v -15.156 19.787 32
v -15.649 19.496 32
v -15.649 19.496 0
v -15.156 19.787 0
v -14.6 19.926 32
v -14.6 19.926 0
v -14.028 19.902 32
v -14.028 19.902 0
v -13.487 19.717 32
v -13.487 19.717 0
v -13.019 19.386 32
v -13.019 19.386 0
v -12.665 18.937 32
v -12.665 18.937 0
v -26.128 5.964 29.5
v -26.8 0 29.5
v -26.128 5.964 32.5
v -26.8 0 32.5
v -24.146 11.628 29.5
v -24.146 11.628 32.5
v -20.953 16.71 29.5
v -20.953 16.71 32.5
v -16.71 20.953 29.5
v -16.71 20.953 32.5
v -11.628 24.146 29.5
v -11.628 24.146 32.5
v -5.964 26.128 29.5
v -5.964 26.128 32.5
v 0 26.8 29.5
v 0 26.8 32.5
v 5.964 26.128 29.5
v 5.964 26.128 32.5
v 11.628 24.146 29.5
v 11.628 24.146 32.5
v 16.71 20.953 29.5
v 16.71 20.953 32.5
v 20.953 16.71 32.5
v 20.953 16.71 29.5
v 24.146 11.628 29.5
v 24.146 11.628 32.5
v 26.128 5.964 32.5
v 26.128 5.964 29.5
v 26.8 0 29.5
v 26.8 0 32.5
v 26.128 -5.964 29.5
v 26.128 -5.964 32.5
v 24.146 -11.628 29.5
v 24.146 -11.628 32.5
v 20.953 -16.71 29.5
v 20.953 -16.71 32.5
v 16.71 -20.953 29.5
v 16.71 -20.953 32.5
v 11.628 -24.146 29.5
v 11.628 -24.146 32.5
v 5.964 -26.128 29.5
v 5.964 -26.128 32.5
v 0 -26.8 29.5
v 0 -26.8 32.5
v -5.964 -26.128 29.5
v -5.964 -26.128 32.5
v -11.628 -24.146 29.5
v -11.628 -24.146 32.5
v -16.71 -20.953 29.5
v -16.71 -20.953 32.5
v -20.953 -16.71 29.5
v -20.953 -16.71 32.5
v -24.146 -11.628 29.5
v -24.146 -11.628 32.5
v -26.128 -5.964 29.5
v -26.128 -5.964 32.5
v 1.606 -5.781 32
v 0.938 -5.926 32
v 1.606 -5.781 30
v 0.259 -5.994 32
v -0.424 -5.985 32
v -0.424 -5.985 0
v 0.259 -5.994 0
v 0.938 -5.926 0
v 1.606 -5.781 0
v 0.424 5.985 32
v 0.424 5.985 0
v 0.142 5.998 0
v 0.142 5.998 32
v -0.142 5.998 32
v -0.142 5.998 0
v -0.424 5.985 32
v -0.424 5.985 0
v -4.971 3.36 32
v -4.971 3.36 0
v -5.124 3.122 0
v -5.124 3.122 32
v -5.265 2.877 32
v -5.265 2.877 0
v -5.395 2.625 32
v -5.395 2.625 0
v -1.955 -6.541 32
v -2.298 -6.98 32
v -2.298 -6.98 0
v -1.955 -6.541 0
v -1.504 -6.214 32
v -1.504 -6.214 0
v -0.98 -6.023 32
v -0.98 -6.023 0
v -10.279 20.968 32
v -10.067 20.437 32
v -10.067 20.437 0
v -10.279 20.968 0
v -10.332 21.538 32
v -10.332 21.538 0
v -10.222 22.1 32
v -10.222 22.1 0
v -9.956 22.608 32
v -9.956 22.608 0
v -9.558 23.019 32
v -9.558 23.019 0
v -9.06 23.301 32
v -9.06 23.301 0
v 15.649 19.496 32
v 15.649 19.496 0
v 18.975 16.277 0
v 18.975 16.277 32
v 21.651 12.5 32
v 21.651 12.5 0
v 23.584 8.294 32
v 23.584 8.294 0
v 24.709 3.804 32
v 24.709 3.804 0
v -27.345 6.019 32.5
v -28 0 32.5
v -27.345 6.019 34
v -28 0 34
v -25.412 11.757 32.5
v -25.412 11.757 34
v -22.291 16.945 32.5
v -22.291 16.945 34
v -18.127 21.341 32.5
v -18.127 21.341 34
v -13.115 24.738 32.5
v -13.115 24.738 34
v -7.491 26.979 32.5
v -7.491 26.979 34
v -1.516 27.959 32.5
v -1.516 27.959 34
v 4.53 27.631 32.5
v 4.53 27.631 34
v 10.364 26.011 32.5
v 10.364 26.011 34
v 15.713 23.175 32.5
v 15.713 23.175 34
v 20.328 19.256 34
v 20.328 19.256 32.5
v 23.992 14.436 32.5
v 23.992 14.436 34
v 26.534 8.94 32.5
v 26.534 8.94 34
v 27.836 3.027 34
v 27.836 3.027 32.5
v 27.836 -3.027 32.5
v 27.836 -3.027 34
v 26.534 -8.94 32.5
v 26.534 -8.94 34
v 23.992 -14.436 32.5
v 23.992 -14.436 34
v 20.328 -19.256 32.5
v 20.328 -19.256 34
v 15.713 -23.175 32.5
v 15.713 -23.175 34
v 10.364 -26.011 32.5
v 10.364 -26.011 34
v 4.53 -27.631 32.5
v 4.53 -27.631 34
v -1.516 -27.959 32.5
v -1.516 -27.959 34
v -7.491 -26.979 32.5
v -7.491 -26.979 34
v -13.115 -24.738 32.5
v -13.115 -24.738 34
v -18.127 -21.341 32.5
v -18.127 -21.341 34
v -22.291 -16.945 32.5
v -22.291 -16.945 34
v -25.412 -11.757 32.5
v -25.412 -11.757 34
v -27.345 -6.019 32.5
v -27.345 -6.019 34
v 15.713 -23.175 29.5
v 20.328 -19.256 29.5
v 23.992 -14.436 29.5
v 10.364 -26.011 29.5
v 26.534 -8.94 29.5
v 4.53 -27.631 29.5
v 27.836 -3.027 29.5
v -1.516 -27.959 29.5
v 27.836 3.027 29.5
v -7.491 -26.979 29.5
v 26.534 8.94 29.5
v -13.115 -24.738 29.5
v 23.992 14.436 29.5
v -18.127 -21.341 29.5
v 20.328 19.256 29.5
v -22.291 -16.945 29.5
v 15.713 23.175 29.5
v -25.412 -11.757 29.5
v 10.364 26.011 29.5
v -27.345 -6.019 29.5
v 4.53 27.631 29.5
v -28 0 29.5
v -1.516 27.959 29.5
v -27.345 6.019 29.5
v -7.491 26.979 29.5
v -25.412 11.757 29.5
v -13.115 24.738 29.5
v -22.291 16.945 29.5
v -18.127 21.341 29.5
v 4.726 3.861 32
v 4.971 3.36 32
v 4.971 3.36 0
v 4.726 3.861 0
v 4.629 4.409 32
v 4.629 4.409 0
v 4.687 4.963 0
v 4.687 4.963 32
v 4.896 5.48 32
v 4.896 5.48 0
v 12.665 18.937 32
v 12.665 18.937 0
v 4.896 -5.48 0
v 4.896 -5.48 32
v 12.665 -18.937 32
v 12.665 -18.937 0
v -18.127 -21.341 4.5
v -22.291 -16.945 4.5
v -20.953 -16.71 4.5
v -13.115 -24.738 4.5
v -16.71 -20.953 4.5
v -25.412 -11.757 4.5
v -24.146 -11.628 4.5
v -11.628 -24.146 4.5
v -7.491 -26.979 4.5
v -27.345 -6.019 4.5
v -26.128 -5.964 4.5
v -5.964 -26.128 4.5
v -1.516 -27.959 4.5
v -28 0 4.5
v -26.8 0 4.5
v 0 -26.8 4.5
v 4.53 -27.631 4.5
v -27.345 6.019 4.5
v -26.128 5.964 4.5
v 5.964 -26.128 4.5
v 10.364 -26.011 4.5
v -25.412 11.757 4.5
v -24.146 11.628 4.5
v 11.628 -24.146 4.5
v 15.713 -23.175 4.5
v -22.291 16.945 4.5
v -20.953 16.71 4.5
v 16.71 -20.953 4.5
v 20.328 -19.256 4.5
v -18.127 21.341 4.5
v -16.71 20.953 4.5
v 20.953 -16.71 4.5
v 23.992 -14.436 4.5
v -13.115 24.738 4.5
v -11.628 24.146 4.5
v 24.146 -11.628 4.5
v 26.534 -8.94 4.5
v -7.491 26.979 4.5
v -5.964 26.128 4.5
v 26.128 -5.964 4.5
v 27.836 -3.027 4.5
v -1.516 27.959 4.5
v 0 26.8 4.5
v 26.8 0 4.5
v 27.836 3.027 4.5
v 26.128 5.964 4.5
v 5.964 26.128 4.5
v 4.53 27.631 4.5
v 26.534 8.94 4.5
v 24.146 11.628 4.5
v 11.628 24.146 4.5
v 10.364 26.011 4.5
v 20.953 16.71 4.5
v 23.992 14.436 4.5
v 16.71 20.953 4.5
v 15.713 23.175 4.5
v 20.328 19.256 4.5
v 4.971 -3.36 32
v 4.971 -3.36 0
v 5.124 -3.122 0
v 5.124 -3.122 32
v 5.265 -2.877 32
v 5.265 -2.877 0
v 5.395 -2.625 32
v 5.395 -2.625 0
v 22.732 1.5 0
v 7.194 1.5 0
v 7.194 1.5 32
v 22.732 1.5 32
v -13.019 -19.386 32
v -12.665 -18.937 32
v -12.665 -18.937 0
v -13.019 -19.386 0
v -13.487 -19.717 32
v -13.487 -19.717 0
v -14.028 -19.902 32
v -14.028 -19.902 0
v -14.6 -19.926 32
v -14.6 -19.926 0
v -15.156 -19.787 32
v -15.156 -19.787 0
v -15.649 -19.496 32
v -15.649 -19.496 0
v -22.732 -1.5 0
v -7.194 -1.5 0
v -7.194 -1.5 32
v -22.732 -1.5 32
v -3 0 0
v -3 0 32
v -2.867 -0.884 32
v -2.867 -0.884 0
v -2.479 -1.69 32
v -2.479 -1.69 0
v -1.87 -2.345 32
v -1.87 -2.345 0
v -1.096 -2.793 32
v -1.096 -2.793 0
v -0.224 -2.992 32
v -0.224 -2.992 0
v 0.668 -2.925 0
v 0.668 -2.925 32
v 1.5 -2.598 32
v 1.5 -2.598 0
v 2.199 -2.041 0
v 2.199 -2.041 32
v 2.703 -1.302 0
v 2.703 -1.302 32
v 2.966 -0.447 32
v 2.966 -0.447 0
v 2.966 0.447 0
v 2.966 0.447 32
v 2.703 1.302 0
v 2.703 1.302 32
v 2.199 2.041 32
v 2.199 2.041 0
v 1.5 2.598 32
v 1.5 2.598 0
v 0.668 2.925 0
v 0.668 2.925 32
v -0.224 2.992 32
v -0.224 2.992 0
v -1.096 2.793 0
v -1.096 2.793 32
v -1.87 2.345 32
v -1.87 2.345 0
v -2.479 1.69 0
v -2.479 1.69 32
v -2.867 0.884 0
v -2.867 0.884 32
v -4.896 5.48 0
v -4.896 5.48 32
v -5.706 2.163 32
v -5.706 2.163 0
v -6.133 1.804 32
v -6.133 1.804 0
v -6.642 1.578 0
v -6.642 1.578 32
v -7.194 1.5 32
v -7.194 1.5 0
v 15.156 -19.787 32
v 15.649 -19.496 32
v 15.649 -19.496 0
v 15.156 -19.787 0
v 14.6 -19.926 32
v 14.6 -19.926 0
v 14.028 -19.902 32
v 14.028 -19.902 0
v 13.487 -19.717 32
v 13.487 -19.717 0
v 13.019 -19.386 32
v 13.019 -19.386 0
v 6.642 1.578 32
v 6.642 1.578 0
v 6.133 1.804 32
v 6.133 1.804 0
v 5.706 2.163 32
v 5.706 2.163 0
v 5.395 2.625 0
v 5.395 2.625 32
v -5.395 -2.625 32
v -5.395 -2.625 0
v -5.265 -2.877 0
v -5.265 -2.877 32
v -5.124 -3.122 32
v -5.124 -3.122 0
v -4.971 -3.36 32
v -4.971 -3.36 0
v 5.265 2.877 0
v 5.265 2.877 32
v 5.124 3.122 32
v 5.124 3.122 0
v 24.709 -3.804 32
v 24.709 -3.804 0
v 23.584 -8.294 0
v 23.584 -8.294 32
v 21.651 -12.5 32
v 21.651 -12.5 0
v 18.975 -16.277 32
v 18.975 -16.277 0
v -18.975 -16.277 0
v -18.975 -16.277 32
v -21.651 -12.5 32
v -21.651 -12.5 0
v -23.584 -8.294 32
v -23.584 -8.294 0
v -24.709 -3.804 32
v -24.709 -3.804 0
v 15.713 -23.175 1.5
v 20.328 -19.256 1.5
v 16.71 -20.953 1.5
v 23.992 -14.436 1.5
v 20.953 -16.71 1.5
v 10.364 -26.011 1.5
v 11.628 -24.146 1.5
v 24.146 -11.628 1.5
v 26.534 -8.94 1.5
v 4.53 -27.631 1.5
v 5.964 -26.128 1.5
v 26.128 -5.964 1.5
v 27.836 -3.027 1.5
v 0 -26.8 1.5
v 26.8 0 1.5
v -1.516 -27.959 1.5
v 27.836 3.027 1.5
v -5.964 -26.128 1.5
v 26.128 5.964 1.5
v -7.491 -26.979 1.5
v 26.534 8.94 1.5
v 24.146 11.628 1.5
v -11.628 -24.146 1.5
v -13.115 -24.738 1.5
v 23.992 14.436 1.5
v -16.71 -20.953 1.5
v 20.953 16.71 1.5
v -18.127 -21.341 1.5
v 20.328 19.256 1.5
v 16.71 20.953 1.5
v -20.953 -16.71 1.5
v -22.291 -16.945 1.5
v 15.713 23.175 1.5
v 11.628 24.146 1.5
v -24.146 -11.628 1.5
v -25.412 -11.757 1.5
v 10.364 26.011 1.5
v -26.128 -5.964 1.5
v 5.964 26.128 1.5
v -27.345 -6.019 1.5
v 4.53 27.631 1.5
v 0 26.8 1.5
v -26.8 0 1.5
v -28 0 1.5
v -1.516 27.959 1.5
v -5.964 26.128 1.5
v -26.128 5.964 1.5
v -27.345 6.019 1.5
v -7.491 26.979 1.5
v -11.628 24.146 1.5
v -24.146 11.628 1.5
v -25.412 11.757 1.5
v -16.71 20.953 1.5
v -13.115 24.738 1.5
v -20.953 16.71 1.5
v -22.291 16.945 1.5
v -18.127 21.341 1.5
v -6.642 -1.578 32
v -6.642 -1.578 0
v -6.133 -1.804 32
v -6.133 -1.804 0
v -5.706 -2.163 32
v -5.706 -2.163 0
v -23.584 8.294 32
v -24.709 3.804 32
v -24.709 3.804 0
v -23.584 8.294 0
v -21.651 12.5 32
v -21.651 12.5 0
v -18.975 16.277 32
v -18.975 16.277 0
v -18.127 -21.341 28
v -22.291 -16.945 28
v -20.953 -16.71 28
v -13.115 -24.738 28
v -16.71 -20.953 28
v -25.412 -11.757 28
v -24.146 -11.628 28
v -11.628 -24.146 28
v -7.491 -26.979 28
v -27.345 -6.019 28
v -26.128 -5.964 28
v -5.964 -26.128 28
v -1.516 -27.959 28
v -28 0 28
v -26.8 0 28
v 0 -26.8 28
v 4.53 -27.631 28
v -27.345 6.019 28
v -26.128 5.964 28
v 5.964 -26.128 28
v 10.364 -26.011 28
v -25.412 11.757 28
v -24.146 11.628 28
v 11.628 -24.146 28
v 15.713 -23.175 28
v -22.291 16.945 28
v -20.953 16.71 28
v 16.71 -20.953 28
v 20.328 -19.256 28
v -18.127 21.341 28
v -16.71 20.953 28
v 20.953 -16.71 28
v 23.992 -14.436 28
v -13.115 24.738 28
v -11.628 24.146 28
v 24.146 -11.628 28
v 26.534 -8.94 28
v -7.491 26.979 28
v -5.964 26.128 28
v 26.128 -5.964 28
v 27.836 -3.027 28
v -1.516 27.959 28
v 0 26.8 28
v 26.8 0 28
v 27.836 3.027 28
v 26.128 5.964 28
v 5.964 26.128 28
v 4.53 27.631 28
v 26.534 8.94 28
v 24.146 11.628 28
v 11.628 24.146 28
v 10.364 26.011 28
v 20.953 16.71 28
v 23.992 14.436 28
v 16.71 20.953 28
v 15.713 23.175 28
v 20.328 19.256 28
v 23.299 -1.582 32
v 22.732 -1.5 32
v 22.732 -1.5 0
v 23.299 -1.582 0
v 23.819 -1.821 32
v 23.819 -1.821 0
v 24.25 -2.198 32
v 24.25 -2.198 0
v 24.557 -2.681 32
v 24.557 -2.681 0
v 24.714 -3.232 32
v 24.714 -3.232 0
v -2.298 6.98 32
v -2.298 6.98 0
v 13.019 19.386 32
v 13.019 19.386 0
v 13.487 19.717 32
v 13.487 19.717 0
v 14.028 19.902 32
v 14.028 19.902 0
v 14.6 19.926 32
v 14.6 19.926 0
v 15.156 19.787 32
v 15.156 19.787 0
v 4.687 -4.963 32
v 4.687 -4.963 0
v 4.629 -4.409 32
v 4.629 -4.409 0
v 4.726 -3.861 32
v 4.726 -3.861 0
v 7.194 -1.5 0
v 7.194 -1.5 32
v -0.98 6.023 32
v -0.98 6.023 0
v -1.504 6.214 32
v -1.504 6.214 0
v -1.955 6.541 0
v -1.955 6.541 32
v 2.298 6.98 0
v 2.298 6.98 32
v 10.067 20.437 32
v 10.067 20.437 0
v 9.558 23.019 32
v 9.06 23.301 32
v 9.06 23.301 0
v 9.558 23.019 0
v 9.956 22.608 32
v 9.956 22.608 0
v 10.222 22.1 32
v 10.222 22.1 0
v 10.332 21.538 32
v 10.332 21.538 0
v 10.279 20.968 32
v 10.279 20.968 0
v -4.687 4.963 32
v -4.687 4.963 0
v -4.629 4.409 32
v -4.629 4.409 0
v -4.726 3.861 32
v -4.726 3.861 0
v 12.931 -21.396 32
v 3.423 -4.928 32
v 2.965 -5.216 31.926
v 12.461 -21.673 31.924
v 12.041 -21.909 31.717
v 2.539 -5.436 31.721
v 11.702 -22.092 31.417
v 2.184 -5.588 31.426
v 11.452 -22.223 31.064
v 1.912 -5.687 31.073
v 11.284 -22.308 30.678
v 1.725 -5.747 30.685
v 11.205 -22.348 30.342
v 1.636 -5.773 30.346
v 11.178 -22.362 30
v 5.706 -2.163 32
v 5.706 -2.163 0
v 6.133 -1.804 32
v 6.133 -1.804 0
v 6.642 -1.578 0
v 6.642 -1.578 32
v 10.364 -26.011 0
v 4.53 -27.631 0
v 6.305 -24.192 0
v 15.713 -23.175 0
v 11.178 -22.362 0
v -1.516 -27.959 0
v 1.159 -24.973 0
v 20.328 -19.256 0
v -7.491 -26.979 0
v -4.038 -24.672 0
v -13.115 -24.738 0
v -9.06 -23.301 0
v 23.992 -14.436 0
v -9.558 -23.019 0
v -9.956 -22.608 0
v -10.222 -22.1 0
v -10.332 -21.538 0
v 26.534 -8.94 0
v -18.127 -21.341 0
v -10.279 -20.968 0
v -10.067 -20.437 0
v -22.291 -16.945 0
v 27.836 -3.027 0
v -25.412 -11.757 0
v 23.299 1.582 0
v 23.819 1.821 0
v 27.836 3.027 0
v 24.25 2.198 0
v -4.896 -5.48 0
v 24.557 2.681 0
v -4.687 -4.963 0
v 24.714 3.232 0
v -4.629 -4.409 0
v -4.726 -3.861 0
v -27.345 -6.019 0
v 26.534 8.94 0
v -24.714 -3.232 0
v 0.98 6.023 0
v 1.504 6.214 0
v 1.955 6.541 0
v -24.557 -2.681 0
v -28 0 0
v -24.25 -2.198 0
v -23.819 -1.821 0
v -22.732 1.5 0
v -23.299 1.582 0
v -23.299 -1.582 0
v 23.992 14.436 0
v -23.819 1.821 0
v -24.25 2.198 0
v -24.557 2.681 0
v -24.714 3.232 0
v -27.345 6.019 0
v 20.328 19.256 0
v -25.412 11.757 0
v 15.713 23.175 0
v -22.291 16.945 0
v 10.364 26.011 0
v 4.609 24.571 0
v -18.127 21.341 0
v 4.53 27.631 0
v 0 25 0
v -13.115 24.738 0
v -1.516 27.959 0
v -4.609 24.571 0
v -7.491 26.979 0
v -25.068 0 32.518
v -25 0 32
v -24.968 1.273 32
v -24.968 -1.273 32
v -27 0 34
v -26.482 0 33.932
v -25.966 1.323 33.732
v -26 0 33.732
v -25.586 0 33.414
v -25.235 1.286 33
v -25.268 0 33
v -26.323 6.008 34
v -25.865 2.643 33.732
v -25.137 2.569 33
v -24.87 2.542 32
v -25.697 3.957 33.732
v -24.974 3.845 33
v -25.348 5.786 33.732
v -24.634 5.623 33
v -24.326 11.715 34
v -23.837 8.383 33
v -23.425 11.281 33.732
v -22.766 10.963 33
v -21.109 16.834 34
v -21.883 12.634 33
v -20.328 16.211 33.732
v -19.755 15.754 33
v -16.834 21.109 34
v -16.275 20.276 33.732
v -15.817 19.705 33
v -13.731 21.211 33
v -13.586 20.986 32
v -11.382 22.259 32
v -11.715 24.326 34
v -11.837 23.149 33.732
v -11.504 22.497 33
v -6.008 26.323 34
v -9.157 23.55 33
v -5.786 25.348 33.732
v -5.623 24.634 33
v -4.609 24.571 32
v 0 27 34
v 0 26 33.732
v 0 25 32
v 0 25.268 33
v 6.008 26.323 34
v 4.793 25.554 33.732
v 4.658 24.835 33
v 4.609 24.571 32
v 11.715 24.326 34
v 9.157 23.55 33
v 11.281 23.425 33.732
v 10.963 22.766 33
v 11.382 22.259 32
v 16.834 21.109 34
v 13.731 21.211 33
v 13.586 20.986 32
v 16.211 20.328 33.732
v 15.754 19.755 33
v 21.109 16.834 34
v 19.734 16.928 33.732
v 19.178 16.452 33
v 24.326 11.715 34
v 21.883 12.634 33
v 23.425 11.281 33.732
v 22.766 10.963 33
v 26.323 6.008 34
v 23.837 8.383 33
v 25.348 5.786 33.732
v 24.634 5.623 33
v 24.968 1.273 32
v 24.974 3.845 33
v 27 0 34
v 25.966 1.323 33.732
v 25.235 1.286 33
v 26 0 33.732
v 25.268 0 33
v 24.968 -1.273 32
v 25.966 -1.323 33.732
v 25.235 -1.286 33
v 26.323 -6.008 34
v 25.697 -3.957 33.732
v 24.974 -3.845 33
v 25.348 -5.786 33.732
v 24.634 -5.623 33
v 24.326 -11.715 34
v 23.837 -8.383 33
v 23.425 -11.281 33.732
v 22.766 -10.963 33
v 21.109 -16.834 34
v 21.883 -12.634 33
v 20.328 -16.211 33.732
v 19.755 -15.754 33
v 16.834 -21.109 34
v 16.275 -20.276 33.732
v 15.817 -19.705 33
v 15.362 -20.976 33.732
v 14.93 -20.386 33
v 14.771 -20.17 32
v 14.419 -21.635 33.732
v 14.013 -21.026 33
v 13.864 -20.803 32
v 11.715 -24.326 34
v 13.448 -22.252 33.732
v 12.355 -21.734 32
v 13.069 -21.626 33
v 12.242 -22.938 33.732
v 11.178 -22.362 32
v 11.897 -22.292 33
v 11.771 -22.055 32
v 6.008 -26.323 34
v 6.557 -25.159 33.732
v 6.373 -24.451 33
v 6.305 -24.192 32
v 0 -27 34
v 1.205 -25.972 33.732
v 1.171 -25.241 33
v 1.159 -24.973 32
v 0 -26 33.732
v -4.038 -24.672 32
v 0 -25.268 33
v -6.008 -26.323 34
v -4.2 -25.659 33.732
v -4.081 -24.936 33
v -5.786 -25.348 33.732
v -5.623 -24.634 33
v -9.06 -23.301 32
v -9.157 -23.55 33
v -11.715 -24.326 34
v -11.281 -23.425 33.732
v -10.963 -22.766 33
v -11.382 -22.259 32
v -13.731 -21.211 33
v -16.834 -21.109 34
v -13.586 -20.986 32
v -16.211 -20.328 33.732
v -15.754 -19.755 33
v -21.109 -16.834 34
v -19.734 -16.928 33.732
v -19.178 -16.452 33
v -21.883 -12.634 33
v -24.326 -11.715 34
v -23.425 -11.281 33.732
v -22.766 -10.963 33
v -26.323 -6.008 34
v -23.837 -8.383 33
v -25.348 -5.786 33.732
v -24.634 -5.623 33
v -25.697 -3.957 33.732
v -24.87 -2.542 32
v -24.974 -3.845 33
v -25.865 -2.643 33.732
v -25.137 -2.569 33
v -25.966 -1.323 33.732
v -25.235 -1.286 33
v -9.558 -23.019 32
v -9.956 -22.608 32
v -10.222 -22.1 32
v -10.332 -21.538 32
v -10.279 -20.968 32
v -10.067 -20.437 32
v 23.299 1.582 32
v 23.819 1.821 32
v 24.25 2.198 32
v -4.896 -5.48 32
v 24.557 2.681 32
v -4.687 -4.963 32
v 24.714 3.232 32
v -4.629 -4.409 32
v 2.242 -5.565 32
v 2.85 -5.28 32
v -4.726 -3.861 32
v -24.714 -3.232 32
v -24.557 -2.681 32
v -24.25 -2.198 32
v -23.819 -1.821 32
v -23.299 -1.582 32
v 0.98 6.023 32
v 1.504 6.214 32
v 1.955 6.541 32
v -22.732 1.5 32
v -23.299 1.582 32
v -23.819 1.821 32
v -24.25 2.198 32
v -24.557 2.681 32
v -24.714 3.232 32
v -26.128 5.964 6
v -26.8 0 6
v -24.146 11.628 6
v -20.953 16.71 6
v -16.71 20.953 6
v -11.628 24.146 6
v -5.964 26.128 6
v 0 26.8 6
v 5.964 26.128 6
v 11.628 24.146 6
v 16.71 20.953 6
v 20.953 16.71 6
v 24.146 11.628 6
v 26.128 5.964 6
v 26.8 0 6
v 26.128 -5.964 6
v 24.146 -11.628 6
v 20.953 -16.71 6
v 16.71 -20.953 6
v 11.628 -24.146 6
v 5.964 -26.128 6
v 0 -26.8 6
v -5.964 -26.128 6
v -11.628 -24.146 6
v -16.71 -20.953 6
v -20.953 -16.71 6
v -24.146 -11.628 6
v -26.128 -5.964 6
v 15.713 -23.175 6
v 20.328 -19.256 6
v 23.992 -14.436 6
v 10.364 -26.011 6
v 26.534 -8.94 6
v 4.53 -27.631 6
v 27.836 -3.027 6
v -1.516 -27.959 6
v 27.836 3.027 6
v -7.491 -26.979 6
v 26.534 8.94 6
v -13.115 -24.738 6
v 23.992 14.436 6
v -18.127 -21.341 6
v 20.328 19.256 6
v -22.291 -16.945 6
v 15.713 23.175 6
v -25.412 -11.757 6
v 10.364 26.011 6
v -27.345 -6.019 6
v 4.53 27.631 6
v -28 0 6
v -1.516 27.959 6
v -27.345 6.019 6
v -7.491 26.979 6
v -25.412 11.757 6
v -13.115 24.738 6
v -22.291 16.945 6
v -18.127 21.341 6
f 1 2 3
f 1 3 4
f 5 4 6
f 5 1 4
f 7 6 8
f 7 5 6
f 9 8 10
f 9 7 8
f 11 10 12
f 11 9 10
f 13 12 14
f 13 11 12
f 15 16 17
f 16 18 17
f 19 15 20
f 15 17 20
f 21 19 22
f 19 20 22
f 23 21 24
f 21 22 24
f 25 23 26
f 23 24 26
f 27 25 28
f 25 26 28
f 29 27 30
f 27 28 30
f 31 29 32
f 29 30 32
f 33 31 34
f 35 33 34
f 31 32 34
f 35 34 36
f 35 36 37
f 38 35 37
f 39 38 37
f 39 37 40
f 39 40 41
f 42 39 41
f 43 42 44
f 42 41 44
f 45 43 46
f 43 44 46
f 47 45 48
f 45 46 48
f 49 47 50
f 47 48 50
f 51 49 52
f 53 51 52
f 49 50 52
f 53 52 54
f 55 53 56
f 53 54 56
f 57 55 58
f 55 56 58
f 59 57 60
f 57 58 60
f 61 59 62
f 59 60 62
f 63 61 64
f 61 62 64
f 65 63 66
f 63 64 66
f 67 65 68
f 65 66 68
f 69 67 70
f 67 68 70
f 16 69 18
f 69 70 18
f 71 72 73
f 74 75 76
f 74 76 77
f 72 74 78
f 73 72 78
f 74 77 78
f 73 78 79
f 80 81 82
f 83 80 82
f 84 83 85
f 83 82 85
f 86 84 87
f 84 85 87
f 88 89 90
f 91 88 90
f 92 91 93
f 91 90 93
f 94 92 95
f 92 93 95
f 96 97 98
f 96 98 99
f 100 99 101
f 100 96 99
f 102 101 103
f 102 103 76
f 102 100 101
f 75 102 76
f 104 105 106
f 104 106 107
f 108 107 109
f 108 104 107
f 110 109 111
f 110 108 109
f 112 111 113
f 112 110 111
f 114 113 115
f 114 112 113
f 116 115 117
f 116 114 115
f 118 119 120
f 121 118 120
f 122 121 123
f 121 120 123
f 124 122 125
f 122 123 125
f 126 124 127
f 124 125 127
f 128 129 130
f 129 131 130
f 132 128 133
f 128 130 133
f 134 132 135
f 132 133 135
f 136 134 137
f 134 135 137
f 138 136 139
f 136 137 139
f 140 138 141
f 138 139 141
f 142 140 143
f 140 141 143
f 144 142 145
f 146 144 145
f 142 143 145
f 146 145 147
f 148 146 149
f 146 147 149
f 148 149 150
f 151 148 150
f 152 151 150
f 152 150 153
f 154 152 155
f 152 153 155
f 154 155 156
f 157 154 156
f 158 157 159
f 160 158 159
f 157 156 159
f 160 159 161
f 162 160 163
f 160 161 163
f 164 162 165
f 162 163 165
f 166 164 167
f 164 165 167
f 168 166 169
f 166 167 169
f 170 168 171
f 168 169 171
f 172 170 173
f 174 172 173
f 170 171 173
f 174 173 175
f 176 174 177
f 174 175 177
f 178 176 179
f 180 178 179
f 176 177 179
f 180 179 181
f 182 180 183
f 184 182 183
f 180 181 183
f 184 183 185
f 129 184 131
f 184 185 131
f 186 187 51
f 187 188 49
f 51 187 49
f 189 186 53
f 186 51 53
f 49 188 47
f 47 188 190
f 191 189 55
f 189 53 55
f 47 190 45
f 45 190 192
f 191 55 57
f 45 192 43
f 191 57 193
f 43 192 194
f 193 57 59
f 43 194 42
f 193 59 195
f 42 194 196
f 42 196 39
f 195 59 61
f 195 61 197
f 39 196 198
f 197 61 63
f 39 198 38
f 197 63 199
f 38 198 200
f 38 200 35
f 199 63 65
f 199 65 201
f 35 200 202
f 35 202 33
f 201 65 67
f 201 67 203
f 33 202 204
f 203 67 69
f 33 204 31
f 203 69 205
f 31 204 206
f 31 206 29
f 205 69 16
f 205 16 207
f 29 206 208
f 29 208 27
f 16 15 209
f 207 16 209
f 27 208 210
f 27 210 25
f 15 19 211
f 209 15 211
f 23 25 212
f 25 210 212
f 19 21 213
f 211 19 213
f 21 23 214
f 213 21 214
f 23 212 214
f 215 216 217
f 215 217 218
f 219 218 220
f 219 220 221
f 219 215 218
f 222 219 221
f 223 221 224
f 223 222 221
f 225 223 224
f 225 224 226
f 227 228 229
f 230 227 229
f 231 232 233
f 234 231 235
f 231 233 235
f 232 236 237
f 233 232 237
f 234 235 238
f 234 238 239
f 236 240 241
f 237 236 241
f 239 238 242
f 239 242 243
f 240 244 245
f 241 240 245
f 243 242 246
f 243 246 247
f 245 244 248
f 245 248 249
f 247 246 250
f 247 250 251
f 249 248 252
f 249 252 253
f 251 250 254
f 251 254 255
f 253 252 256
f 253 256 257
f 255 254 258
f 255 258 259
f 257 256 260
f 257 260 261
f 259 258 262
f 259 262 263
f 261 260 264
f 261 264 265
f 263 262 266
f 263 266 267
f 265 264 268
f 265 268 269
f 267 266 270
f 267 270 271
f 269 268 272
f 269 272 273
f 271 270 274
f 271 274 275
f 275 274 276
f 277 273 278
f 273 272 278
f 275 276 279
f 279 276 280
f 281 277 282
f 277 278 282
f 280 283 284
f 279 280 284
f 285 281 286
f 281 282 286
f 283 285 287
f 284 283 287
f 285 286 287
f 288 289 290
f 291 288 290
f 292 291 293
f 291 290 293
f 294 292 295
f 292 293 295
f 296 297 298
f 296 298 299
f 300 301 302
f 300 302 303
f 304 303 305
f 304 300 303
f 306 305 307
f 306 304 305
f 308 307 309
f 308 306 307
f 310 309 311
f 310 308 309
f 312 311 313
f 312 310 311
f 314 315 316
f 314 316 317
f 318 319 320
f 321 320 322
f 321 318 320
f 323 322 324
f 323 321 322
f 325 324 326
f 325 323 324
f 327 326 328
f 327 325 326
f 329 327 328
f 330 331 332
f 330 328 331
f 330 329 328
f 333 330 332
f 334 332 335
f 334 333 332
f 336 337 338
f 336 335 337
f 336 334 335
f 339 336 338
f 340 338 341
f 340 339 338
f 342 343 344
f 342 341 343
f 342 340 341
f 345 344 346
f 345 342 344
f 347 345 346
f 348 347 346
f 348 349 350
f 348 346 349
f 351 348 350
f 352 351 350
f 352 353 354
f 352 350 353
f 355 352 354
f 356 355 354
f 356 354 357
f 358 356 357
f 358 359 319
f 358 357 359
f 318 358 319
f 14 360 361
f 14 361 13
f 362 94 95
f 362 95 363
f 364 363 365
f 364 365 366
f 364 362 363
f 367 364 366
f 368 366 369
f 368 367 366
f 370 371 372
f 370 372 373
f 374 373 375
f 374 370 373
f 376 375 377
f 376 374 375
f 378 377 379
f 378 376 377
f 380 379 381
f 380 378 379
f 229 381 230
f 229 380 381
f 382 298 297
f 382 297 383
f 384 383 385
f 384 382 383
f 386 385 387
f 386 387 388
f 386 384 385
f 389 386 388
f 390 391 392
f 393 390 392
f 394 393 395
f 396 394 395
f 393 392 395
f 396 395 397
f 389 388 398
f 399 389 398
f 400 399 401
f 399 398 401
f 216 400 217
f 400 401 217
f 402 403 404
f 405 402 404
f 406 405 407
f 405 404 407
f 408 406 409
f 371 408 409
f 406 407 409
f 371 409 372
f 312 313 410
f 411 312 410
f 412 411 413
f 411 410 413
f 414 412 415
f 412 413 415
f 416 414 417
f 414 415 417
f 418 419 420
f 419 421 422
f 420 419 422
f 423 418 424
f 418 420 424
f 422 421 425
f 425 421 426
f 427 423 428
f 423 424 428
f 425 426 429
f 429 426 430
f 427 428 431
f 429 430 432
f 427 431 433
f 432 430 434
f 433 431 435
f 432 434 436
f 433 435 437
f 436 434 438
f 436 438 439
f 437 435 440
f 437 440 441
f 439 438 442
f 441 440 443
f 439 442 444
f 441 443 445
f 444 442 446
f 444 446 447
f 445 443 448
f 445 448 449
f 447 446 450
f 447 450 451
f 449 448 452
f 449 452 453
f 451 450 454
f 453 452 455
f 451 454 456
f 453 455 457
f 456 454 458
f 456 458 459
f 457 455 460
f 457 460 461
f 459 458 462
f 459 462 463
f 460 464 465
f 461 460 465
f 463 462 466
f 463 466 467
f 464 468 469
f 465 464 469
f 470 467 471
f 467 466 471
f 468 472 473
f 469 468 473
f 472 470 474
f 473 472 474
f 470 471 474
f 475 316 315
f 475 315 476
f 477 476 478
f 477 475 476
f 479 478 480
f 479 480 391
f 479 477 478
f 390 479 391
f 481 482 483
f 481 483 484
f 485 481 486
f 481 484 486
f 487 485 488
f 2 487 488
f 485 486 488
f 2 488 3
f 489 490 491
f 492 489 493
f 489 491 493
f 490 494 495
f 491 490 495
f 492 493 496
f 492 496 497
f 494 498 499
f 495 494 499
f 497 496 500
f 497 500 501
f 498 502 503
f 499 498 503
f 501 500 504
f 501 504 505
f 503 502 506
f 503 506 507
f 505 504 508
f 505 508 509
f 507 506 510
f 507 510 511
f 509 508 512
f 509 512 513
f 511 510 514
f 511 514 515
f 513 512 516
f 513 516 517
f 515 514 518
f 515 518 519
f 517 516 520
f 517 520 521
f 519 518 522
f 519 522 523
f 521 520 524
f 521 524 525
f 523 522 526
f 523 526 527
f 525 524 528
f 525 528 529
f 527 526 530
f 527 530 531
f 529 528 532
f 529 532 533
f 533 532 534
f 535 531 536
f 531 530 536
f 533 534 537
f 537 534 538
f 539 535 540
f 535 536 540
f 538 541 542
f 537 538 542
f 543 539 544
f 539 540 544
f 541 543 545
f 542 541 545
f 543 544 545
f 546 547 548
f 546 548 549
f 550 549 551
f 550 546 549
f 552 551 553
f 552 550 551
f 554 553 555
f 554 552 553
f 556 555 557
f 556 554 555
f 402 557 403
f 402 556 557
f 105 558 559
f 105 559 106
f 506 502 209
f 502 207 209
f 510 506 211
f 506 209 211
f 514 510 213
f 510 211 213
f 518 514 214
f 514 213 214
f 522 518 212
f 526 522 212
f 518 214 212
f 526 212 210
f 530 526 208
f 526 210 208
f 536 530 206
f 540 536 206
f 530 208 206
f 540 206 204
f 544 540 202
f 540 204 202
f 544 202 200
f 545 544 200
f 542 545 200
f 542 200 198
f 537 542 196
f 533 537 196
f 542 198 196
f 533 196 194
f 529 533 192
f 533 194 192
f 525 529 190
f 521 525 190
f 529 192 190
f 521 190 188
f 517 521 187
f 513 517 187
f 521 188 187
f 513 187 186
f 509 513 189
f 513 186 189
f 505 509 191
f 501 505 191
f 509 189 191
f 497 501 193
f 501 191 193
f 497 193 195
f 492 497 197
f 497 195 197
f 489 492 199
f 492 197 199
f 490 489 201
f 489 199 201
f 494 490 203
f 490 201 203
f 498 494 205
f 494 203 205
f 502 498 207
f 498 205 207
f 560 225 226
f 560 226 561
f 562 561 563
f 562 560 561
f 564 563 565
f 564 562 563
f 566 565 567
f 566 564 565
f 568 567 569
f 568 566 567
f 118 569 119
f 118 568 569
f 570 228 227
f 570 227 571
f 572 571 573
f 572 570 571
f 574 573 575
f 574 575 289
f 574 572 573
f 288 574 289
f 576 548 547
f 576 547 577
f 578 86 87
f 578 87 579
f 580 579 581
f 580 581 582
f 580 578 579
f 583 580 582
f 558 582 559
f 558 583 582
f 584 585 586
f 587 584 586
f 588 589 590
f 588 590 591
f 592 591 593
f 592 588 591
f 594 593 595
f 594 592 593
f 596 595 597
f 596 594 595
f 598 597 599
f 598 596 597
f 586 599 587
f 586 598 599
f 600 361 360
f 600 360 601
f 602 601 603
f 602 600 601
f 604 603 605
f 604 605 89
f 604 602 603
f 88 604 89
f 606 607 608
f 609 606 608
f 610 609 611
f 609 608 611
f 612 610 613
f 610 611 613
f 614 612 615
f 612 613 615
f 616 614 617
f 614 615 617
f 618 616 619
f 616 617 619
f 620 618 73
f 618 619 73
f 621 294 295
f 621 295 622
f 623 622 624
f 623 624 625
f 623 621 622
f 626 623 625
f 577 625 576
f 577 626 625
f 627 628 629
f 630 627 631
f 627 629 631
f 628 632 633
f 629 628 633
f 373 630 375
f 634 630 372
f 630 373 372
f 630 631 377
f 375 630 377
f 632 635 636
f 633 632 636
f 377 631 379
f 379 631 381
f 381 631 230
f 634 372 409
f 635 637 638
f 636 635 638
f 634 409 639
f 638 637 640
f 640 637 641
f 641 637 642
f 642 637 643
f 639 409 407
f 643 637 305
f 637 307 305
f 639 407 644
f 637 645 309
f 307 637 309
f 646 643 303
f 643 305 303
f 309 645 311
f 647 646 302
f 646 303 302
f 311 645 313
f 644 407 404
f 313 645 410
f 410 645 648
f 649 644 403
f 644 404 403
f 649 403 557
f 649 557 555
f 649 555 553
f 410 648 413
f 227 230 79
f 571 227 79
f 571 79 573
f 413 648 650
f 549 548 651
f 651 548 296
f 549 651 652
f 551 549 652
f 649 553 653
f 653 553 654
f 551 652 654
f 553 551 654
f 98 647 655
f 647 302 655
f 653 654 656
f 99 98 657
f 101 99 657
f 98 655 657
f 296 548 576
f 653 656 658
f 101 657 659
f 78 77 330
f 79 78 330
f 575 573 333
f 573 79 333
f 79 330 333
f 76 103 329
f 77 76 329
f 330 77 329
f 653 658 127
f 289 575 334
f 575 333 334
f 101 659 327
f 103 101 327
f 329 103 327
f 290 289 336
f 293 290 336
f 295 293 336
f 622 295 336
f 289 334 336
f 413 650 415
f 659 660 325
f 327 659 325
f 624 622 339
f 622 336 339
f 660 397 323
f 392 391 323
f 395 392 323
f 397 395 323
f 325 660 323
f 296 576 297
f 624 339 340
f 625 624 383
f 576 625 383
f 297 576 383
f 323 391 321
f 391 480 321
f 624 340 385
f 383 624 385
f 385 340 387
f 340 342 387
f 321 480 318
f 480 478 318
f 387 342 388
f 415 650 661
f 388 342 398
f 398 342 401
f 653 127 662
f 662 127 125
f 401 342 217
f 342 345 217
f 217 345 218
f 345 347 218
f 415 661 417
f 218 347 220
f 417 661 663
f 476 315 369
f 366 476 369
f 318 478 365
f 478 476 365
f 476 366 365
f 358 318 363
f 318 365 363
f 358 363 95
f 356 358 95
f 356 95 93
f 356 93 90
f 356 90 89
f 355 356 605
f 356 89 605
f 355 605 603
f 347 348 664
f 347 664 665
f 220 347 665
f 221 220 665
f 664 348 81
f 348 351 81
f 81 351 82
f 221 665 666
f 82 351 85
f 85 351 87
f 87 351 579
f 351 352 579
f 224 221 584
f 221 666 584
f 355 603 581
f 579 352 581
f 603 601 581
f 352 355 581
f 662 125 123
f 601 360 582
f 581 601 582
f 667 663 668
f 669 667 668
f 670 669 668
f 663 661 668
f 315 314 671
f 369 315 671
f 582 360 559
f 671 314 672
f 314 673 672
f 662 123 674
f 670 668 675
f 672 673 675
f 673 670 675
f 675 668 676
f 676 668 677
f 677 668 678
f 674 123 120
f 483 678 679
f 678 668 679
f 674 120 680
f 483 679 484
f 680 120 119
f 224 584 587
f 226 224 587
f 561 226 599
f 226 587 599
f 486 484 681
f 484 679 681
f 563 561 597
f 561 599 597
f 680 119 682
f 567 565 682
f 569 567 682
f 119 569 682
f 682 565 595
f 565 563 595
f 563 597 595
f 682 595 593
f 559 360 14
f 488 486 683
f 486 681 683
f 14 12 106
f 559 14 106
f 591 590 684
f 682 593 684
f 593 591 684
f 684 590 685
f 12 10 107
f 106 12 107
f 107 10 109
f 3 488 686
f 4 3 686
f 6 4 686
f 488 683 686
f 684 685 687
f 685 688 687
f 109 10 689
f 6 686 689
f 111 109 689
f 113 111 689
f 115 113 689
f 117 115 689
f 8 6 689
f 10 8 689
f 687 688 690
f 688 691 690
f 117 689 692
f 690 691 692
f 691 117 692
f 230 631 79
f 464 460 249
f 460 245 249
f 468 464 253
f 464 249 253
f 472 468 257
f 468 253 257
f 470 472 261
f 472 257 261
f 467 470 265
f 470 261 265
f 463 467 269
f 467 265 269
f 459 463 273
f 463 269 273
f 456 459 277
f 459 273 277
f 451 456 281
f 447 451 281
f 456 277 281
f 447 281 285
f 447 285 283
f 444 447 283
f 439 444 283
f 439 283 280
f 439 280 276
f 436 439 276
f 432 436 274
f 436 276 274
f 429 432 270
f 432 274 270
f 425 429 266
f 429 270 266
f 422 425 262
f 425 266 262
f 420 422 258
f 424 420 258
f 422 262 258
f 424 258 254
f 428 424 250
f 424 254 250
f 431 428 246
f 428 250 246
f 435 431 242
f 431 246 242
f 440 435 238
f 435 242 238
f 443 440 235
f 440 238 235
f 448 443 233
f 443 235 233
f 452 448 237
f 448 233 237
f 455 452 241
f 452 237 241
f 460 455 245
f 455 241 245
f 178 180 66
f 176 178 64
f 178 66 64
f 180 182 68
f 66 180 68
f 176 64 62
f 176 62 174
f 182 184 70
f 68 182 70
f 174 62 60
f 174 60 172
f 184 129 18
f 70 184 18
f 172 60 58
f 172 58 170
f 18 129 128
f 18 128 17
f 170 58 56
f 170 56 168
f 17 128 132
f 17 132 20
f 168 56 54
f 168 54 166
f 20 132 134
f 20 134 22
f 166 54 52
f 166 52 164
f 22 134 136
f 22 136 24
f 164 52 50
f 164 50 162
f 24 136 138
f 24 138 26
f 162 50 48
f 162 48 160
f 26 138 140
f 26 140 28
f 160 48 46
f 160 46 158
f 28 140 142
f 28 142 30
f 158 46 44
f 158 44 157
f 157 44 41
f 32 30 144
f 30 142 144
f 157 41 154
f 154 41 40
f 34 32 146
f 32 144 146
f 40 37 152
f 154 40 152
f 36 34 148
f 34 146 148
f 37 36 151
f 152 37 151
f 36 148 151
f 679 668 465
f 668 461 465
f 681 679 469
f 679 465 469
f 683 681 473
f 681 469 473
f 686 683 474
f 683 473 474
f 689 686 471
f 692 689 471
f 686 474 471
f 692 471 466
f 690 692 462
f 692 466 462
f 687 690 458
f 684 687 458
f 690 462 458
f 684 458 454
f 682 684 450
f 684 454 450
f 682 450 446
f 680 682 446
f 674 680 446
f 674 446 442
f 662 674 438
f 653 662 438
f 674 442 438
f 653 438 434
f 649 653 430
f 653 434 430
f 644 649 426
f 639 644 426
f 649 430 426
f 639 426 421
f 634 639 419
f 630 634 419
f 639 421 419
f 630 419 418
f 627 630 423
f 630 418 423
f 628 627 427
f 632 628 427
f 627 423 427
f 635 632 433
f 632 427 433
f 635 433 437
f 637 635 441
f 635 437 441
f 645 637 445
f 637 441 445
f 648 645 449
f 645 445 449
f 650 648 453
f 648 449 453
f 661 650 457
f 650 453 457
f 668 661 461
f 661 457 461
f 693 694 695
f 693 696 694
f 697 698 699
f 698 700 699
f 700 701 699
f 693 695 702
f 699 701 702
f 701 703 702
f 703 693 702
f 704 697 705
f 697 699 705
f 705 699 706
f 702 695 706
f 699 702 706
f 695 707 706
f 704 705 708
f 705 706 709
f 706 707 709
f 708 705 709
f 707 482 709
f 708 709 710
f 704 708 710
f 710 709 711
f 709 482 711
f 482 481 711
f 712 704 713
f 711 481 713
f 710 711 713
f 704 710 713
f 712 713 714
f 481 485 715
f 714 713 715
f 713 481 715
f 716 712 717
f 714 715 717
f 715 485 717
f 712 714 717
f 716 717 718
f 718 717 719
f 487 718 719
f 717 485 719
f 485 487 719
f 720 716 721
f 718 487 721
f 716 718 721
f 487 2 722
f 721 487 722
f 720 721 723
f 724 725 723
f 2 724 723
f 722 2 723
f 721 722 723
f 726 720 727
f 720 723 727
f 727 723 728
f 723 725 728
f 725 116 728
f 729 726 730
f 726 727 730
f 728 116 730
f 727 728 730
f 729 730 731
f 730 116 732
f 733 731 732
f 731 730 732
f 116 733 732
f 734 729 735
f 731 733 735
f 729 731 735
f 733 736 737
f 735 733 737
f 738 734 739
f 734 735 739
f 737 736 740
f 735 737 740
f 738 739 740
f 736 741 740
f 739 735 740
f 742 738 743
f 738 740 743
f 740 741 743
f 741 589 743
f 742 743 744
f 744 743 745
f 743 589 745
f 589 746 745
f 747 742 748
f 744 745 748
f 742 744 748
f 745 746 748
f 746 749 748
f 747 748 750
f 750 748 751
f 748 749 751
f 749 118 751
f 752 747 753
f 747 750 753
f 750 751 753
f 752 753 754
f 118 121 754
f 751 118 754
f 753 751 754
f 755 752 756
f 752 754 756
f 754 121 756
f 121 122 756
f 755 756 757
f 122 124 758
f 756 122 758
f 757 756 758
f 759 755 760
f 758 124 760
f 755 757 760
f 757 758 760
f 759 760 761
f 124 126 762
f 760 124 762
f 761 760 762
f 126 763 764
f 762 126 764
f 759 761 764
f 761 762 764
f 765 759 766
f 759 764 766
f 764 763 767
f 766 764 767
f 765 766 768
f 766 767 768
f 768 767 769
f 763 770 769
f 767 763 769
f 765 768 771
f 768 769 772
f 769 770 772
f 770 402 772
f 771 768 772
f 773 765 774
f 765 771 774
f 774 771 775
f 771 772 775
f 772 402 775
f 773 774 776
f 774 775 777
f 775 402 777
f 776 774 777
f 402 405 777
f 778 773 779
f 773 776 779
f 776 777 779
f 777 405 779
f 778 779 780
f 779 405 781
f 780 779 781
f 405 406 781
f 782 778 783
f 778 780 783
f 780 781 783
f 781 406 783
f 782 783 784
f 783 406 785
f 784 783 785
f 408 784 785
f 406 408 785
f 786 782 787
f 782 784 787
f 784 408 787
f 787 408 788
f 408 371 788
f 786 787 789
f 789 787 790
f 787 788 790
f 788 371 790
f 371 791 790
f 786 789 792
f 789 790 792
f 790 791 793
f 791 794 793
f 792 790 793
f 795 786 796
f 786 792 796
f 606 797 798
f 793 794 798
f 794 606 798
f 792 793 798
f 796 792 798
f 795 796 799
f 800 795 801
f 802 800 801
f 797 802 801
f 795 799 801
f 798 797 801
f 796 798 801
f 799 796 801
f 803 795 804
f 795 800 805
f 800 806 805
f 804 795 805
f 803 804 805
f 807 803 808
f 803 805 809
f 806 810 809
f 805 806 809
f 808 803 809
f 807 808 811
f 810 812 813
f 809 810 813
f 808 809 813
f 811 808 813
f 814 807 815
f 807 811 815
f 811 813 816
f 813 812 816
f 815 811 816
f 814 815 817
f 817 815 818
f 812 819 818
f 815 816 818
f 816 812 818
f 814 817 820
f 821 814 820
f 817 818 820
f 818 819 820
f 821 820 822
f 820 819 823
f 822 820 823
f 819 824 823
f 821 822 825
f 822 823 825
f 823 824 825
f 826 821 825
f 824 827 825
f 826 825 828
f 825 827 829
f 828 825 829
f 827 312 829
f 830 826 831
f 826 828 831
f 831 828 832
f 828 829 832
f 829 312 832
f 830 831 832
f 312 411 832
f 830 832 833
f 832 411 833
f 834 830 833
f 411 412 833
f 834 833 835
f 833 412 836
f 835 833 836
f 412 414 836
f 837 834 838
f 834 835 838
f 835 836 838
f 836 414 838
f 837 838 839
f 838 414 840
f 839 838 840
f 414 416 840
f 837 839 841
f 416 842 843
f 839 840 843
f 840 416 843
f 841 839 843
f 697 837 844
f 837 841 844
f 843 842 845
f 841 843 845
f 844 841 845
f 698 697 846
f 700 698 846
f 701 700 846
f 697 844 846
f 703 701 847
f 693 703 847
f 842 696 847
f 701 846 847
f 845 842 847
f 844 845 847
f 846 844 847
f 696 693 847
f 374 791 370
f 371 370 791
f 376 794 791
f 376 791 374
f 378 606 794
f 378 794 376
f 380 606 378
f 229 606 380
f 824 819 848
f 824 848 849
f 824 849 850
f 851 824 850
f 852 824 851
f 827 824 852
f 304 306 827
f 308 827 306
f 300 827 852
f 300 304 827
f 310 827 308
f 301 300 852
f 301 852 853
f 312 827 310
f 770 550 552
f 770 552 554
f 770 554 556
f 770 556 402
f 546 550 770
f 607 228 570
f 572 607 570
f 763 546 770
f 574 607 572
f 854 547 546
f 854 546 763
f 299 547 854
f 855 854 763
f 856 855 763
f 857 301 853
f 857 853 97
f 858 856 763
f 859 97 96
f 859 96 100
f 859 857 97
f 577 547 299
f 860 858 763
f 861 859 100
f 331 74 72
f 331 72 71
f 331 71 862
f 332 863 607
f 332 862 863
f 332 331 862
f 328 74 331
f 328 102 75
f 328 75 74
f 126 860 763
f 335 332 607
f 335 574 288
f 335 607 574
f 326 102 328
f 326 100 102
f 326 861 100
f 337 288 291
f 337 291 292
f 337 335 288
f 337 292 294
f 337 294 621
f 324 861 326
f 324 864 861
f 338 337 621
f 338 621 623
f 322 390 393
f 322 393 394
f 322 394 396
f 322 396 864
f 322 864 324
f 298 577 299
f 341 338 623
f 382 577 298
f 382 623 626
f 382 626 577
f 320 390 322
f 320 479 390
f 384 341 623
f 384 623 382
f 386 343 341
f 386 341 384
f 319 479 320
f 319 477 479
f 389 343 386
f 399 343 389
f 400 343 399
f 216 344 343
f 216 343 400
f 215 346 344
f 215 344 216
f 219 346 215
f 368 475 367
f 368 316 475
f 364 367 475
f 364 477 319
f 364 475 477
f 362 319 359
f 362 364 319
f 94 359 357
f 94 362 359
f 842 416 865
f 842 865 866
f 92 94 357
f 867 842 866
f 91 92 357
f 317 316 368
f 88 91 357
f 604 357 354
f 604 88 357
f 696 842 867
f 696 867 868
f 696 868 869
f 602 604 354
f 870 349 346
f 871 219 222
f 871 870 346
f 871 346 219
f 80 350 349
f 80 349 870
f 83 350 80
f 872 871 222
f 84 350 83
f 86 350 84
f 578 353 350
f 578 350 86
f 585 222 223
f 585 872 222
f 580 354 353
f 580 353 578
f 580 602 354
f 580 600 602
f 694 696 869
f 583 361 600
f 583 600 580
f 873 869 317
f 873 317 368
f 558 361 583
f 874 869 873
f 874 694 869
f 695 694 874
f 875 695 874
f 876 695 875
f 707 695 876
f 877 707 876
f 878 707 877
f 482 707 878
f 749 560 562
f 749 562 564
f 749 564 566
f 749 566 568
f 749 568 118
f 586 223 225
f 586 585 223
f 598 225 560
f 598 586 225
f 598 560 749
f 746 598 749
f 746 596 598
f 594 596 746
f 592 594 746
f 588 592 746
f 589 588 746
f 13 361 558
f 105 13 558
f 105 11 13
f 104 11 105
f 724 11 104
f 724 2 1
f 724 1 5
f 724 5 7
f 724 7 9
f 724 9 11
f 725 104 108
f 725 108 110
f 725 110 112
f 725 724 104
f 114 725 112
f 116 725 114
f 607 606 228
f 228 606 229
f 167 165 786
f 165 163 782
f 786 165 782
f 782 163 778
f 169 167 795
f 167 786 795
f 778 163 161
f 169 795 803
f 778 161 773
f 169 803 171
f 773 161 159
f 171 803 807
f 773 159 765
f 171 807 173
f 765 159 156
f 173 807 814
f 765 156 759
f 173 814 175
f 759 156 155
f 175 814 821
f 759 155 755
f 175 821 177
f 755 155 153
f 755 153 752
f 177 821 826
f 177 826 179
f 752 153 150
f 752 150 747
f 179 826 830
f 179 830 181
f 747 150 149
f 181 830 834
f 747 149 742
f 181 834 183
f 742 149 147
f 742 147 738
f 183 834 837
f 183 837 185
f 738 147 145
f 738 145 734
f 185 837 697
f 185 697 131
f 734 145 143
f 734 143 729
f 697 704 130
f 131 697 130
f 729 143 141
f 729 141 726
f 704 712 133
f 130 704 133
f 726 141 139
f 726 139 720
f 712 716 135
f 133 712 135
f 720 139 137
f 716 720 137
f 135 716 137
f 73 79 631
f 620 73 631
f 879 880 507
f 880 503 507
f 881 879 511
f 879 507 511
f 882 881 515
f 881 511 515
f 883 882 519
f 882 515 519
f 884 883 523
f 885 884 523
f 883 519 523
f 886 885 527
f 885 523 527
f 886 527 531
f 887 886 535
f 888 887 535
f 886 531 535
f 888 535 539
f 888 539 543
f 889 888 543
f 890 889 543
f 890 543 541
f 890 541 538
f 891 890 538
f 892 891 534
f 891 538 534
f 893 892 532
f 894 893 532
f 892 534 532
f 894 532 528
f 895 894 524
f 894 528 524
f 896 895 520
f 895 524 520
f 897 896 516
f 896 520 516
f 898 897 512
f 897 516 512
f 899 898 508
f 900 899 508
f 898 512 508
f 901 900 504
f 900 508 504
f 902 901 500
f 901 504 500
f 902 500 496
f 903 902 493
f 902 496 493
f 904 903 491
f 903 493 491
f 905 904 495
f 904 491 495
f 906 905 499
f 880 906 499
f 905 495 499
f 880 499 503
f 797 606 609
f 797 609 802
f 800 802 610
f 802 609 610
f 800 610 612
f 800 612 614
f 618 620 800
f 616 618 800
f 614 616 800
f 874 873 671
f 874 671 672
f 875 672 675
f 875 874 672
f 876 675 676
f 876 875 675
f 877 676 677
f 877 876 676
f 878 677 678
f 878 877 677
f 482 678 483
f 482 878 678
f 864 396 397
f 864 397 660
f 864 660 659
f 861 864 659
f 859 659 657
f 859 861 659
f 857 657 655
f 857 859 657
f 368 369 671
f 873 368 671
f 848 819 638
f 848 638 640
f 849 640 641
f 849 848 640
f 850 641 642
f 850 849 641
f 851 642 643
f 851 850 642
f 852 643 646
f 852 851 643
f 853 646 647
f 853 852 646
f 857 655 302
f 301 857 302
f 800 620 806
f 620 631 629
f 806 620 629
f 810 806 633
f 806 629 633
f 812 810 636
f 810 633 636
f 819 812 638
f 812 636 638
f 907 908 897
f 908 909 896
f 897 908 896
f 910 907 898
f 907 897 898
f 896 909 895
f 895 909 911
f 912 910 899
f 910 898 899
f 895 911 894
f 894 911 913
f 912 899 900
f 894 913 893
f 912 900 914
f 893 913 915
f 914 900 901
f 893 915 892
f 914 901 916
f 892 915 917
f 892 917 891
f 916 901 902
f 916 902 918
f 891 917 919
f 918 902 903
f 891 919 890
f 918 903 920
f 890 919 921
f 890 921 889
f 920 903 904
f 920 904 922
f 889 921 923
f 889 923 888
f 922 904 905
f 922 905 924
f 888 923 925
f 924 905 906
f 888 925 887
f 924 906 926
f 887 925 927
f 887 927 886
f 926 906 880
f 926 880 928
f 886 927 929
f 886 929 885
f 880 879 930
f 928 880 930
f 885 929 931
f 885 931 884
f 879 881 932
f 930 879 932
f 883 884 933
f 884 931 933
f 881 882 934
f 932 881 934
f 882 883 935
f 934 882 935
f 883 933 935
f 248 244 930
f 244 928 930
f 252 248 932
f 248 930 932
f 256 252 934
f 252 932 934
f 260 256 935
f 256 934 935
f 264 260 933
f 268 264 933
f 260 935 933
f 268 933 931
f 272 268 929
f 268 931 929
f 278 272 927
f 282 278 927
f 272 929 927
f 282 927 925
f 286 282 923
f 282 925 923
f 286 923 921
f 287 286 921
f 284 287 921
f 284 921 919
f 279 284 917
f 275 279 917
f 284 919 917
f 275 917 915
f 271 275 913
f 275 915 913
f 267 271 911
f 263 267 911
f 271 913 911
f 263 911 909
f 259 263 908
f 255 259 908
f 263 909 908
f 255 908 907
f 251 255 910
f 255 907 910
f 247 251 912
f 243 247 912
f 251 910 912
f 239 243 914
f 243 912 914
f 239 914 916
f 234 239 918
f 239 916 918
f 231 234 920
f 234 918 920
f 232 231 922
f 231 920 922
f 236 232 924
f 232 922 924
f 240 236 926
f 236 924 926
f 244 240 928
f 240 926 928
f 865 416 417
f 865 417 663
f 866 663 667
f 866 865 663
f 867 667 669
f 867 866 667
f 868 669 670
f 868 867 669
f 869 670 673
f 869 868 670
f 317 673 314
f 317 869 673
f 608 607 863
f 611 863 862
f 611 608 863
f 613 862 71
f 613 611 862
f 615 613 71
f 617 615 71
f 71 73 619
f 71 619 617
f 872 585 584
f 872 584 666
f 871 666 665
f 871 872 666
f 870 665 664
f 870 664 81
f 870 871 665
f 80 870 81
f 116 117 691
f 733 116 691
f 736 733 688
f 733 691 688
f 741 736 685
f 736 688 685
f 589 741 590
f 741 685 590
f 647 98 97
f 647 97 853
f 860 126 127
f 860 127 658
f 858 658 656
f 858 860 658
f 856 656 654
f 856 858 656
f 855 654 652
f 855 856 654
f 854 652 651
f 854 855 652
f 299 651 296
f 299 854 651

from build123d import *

# Parameters (mm, degrees)
SKETCH2_W           = 25
SKETCH2_H           = 3
BOSS_EXTRUDE1_DEPTH = 32
CIRPATTERN1_COUNT   = 6
SKETCH5_R           = 6
BOSS_EXTRUDE2_DEPTH = 32
SKETCH6_R           = 3
AXLEHOLE_DEPTH      = 53.191951405
FILLET1_R           = 2


with BuildPart() as part:
    # Sketch1 → Revolve1 (revolve)
    with BuildSketch(Plane.XZ, mode=Mode.PRIVATE) as revolve1_sk:
        with BuildLine():
            Line((25, 0), (28, 0))
            Line((28, 0), (28, 1.5))
            Line((28, 1.5), (26.8, 1.5))
            Line((26.8, 1.5), (26.8, 4.5))
            Line((26.8, 4.5), (28, 4.5))
            Line((28, 4.5), (28, 6))
            Line((28, 6), (26.8, 6))
            Line((26.8, 6), (26.8, 28))
            Line((26.8, 28), (28, 28))
            Line((28, 28), (28, 29.5))
            Line((28, 29.5), (26.8, 29.5))
            Line((26.8, 29.5), (26.8, 32.5))
            Line((26.8, 32.5), (28, 32.5))
            Line((28, 32.5), (28, 33.999996833))
            Line((28, 33.999996833), (27, 33.999996833))
            ThreePointArc((27, 33.999996833), (25.585786438, 33.414213562), (25, 32))
            Line((25, 32), (25, 0))
        make_face()
    revolve(revolve1_sk.sketch.rotate(Axis((0, 0, 34), (0, 0, -1)), 180), axis=Axis((0, 0, 34), (0, 0, -1)))

    # Sketch2 → Boss-Extrude1 (add)
    with BuildSketch(Plane.XY):
        with Locations((12.5, 0)):
            Rectangle(SKETCH2_W, SKETCH2_H)
    boss_extrude1 = extrude(amount=BOSS_EXTRUDE1_DEPTH)

    # CirPattern1: Boss-Extrude1 ×6 about axis
    cirpattern1_axis = Axis((0, 0, 0), (0, 0, 1))
    for i in range(1, CIRPATTERN1_COUNT):
        add(boss_extrude1.rotate(cirpattern1_axis, i * 360 / CIRPATTERN1_COUNT))

    # Sketch5 → Boss-Extrude2 (add)
    with BuildSketch(Plane.XY):
        Circle(SKETCH5_R)
    extrude(amount=BOSS_EXTRUDE2_DEPTH)

    # Sketch6 → AxleHole (cut, through all)
    with BuildSketch(Plane.XY):
        with Locations(Location((0, 0, 0), (0, 0, 180))):
            Circle(SKETCH6_R)
    extrude(amount=AXLEHOLE_DEPTH, mode=Mode.SUBTRACT)

    # Fillet1
    # the kernel refuses this fillet: 2 mm, written as the material it adds along each edge
    with BuildSketch(Plane(origin=(-24.954959427, -1.5, 32), x_dir=(0.10620109039764976, -0.9943446728365121, 0), z_dir=(0, 0, -1))) as fillet1_piece_1:
        with BuildLine():
            CenterArc((2.224755634, -1.997850608), FILLET1_R, 87.343441845, 98.752929077)
            Line((0.236066288, -2.210252789), (0, 0))
            ThreePointArc((0, 0), (1.158726893, 0.026867397), (2.317453785, 0))
        make_face()
    extrude(amount=32)
    with BuildSketch(Plane(origin=(-13.776517819, -20.861628814, 32), x_dir=(-0.8080272015953212, 0.589145178612228, 0), z_dir=(0, 0, -1)), Plane(origin=(13.776517819, 20.861628814, 32), x_dir=(0.8080272015953204, -0.589145178612229, 0), z_dir=(0, 0, -1)), Plane(origin=(24.954959427, -1.5, 32), x_dir=(-0.10620109039765001, -0.994344672836512, 0), z_dir=(0, 0, -1)), Plane(origin=(-11.178441608, 22.361628814, 32), x_dir=(0.9142282919929711, 0.4051994942242834, 0), z_dir=(0, 0, -1)), Plane(origin=(-24.954959427, 1.5, 32), x_dir=(0.10620109039765026, 0.994344672836512, 0), z_dir=(0, 0, -1))) as fillet1_piece_2:
        with BuildLine():
            CenterArc((2.224755634, 1.997850608), FILLET1_R, 173.903629078, 98.752929077)
            Line((0.236066288, 2.210252789), (0, 0))
            ThreePointArc((0, 0), (1.158726893, -0.026867397), (2.317453785, 0))
        make_face()
    extrude(amount=32)
    with BuildSketch(Plane(origin=(-11.178441608, -22.361628814, 32), x_dir=(0.5000000000000002, 0.8660254037844387, 0), z_dir=(0, 0, -1)), Plane(origin=(13.776517819, -20.861628814, 32), x_dir=(-0.5000000000000002, 0.8660254037844387, 0), z_dir=(0, 0, -1)), Plane(origin=(24.954959427, 1.5, 32), x_dir=(-1, 0, 0), z_dir=(0, 0, -1)), Plane(origin=(11.178441608, 22.361628814, 32), x_dir=(-0.4999999999999994, -0.8660254037844389, 0), z_dir=(0, 0, -1)), Plane(origin=(-13.776517819, 20.861628814, 32), x_dir=(0.5000000000000007, -0.8660254037844382, 0), z_dir=(0, 0, -1))) as fillet1_piece_3:
        with BuildLine():
            CenterArc((2.222823584, 2), FILLET1_R, 171.247070923, 98.752929077)
            ThreePointArc((0.246116119, 2.304347826), (0.096342606, 1.15502726), (0, 0))
            Line((0, 0), (2.222823584, 0))
        make_face()
    extrude(amount=32)
    with BuildSketch(Plane(origin=(5.809475019, 1.5, 32), x_dir=(1, 0, 0), z_dir=(0, 0, -1)), Plane(origin=(4.203775615, -4.281152949, 32), x_dir=(0.5000000000000001, -0.8660254037844386, 0), z_dir=(0, 0, -1)), Plane(origin=(1.605699404, 5.781152949, 32), x_dir=(0.4999999999999986, 0.8660254037844394, 0), z_dir=(0, 0, -1)), Plane(origin=(-4.203775615, 4.281152949, 32), x_dir=(-0.5000000000000004, 0.8660254037844384, 0), z_dir=(0, 0, -1)), Plane(origin=(-5.809475019, -1.5, 32), x_dir=(-1, 0, 0), z_dir=(0, 0, -1)), Plane(origin=(-1.605699404, -5.781152949, 32), x_dir=(-0.4999999999999988, -0.8660254037844393, 0), z_dir=(0, 0, -1))) as fillet1_piece_4:
        with BuildLine():
            CenterArc((1.384272266, -2), FILLET1_R, 90, 64.055520228)
            ThreePointArc((-0.414164556, -1.125), (-0.178914596, -0.572869827), (0, 0))
            Line((0, 0), (1.384272266, 0))
        make_face()
    extrude(amount=32)
    with BuildSketch(Plane(origin=(4.203775615, 4.281152949, 32), x_dir=(0.6399622417657335, -0.7684063567632539, 0), z_dir=(0, 0, -1)), Plane(origin=(5.809475019, -1.5, 32), x_dir=(-0.3454783045035584, -0.9384267372135913, 0), z_dir=(0, 0, -1)), Plane(origin=(-1.605699404, 5.781152949, 32), x_dir=(0.9854405462692932, 0.1700203804503366, 0), z_dir=(0, 0, -1)), Plane(origin=(-5.809475019, 1.5, 32), x_dir=(0.3454783045035597, 0.9384267372135907, 0), z_dir=(0, 0, -1))) as fillet1_piece_5:
        with BuildLine():
            CenterArc((1.398617439, -1.989994715), FILLET1_R, 95.733483793, 64.055520228)
            Line((-0.478236035, -1.299038106), (0, 0))
            ThreePointArc((0, 0), (0.599407474, -0.030015856), (1.198814948, 0))
        make_face()
    extrude(amount=32)
    with BuildSketch(Plane(origin=(-4.203775615, -4.281152949, 32), x_dir=(-0.4999999999999996, -0.8660254037844388, 0), z_dir=(0, 0, -1))) as fillet1_piece_6:
        with BuildLine():
            CenterArc((1.384272266, 2), FILLET1_R, 205.944479772, 64.055520228)
            ThreePointArc((-0.414164556, 1.125), (-0.178914596, 0.572869827), (0, 0))
            Line((0, 0), (1.384272266, 0))
        make_face()
    extrude(amount=32)
    # the kernel refuses this fillet: 2 mm, written as the material it takes off along each edge
    with BuildSketch(Plane(origin=(-0.894300596, -1.45102593, 32), x_dir=(0.8660254037844385, 0.5000000000000003, 0), z_dir=(0.5000000000000003, -0.8660254037844386, 0))) as fillet1_2_piece_1_section:
        with BuildLine():
            CenterArc((FILLET1_R, -FILLET1_R), FILLET1_R, 90, 90)
            Line((0, -FILLET1_R), (0, 0))
            Line((0, 0), (FILLET1_R, 0))
        make_face()
    fillet1_2_piece_1 = extrude(amount=29.145484408, mode=Mode.PRIVATE)
    fillet1_2_piece_1 = fillet1_2_piece_1 & Plane(origin=(0, 0, 31.552739603), x_dir=(-1, 0, 0), z_dir=(0, 0, -1)) * Cylinder(25, 67, mode=Mode.PRIVATE)
    fillet1_2_piece_1 = fillet1_2_piece_1 - Plane(origin=(0, 0, 31.552739603), x_dir=(1, 0, 0), z_dir=(0, 0, -1)) * Cylinder(6, 67, mode=Mode.PRIVATE)
    add(fillet1_2_piece_1, mode=Mode.SUBTRACT)


solid = part.part
